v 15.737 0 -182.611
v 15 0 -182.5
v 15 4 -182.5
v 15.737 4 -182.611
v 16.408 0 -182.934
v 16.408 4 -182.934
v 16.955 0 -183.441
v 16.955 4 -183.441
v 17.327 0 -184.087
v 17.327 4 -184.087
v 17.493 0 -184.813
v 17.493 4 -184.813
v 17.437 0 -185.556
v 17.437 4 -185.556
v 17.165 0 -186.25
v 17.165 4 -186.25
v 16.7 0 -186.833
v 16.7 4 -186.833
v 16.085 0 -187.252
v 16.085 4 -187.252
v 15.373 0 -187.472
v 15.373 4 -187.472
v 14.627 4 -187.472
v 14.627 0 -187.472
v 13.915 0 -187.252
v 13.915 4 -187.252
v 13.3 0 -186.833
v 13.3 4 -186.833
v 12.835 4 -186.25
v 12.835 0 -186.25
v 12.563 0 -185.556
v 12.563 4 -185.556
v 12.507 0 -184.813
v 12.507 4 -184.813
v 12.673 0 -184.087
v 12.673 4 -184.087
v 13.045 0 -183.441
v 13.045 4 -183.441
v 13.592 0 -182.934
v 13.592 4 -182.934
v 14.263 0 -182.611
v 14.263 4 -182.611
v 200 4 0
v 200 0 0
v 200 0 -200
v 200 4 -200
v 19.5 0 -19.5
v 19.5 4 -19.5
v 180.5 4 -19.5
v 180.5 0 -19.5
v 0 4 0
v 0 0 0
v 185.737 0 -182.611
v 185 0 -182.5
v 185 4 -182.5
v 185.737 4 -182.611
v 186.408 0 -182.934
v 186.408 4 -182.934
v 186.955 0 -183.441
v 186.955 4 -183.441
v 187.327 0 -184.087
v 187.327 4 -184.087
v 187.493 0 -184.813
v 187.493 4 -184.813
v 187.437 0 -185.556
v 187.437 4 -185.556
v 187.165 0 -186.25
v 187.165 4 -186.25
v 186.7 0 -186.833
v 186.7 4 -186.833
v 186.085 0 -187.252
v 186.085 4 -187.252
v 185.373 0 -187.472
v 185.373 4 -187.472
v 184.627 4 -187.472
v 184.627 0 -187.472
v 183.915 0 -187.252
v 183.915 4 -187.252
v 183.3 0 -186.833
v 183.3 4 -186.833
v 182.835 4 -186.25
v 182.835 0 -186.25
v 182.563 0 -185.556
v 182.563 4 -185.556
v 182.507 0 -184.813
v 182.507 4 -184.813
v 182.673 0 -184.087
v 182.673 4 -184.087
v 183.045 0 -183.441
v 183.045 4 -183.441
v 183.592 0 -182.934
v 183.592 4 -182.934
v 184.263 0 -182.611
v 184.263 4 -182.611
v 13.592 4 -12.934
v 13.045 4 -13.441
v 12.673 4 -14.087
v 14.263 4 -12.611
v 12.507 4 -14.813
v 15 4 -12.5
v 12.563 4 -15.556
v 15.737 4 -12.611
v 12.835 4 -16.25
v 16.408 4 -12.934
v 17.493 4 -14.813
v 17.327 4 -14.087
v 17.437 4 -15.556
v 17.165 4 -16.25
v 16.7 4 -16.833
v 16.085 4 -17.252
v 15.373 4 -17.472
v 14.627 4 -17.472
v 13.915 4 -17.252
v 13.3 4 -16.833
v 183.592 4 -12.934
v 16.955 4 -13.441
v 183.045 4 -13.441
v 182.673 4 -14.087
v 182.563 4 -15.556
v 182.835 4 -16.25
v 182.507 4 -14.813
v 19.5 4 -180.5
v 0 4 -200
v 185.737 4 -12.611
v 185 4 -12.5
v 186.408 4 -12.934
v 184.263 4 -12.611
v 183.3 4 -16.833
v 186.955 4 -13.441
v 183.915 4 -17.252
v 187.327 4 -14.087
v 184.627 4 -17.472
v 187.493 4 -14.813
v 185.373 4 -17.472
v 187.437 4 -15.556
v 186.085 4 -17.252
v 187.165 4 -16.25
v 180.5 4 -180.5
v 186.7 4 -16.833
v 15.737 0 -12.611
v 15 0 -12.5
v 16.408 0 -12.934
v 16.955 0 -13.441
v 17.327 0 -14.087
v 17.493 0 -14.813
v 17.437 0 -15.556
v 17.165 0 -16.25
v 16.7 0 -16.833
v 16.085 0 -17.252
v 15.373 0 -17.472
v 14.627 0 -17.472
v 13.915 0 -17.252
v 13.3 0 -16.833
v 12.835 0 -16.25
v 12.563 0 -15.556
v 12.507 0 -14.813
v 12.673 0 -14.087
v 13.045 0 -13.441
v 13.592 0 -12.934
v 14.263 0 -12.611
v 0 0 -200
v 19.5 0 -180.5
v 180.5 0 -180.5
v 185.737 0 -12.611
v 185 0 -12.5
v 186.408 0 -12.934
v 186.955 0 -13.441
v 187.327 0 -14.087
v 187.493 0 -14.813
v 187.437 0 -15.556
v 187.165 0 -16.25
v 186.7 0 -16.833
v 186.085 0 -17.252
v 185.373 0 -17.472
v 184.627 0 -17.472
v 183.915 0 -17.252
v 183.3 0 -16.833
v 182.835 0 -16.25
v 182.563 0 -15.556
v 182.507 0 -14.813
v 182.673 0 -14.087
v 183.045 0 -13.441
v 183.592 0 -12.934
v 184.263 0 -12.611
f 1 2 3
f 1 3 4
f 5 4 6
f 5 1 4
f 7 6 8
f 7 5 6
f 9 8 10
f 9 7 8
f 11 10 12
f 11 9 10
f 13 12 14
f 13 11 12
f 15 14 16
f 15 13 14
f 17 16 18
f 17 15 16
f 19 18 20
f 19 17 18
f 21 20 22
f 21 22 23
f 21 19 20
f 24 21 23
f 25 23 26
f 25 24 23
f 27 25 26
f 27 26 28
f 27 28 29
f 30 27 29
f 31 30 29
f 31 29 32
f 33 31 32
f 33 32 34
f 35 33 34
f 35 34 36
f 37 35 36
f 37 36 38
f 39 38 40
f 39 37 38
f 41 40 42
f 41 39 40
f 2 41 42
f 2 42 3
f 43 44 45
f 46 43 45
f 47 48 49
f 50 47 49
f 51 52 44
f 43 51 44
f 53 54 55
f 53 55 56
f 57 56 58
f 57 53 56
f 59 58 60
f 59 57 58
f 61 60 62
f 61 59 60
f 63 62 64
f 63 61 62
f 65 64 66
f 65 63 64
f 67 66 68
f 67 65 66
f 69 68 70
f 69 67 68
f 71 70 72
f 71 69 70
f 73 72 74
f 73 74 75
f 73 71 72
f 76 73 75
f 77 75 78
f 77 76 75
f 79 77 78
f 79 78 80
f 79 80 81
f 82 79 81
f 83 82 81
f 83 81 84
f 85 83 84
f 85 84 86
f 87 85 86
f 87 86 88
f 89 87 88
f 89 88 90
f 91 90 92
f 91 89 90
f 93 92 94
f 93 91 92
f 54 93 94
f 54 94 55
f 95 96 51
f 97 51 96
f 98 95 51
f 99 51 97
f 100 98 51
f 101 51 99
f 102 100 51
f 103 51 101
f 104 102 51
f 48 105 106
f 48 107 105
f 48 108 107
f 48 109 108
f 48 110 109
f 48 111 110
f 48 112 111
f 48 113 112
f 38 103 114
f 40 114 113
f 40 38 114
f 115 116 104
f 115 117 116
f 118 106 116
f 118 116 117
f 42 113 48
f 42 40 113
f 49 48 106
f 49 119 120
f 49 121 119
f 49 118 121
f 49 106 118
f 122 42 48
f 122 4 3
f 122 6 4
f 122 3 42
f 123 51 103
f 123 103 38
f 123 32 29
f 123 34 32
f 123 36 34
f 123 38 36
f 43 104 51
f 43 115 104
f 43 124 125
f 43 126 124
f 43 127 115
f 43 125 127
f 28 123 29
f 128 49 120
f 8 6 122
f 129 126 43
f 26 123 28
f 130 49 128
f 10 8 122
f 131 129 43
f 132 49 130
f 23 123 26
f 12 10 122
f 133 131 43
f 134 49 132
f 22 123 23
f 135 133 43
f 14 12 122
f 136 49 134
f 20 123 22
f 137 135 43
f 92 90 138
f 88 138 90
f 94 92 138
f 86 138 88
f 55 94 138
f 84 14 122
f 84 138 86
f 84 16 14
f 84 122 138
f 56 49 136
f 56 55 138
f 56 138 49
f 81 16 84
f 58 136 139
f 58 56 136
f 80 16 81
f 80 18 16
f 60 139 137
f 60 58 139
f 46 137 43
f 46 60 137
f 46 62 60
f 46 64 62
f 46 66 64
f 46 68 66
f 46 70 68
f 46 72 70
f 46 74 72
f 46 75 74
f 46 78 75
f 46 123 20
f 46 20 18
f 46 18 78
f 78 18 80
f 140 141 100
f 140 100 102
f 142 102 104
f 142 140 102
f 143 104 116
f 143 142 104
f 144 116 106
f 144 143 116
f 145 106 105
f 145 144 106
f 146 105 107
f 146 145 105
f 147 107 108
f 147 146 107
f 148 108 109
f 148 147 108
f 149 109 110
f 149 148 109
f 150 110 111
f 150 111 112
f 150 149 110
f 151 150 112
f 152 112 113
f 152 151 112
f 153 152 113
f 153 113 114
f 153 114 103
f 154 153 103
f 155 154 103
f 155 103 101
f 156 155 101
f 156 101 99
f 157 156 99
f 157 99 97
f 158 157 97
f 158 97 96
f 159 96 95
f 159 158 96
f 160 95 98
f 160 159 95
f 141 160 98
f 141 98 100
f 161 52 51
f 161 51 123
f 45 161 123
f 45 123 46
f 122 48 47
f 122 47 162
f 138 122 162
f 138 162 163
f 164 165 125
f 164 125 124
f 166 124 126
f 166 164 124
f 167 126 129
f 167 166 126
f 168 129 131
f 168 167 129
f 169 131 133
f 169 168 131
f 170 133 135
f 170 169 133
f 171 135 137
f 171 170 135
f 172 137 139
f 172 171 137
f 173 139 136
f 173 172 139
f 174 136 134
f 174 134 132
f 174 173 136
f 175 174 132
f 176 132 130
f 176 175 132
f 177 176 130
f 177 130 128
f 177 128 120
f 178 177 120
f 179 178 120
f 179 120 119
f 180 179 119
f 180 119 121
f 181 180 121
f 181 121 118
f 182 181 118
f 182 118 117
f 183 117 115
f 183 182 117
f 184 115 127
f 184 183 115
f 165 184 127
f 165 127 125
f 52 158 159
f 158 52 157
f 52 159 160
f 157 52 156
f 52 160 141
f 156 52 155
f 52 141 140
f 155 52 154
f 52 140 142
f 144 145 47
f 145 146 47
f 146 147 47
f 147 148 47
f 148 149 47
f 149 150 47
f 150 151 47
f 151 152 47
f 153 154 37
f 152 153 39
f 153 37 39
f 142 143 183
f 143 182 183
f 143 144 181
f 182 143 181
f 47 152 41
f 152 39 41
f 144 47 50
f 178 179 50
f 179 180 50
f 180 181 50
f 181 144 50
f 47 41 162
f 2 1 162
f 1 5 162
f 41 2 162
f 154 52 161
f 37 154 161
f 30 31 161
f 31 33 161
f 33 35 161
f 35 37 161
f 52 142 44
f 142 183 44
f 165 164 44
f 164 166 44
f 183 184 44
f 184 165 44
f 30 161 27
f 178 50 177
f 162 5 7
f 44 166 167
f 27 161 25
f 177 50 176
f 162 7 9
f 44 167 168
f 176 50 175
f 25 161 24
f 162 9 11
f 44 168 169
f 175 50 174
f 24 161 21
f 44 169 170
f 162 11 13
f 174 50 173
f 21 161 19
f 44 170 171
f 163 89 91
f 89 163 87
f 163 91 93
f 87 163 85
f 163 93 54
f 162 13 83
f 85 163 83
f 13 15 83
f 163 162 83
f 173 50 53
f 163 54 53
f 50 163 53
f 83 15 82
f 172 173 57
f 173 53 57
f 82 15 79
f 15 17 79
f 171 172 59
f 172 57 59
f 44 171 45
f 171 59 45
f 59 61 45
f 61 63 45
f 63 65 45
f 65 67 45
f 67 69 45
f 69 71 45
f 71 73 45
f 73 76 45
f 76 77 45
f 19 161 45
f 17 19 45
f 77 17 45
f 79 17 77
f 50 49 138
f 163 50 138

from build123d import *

# Parameters (mm, degrees)
CROQUIS1_W              = 200
CROQUIS1_H              = 200
CROQUIS1_R              = 2.5
SALIENTE_EXTRUIR1_DEPTH = 4
CROQUIS2_W              = 158
CROQUIS2_H              = 158
CORTAR_EXTRUIR1_DEPTH   = 10
CROQUIS3_W              = 161
CROQUIS3_H              = 161
CORTAR_EXTRUIR2_DEPTH   = 10


with BuildPart() as part:
    # Croquis1 → Saliente-Extruir1 (new body)
    with BuildSketch(Plane(origin=(0, 0, 0), x_dir=(1, 0, 0), z_dir=(0, 1, 0))):
        with Locations((100, 100)):
            Rectangle(CROQUIS1_W, CROQUIS1_H)
        with Locations(Location((15, 185, 0), (0, 0, 270))):
            Circle(CROQUIS1_R, mode=Mode.SUBTRACT)
        with Locations(Location((185, 185, 0), (0, 0, 270))):
            Circle(CROQUIS1_R, mode=Mode.SUBTRACT)
        with Locations(Location((185, 15, 0), (0, 0, 270))):
            Circle(CROQUIS1_R, mode=Mode.SUBTRACT)
        with Locations(Location((15, 15, 0), (0, 0, 270))):
            Circle(CROQUIS1_R, mode=Mode.SUBTRACT)
    extrude(amount=SALIENTE_EXTRUIR1_DEPTH)

    # Croquis2 → Cortar-Extruir1 (cut)
    with BuildSketch(Plane(origin=(0, 4, 0), x_dir=(1, 0, 0), z_dir=(0, 1, 0))):
        with Locations((100, 100)):
            Rectangle(CROQUIS2_W, CROQUIS2_H)
    extrude(amount=-CORTAR_EXTRUIR1_DEPTH, mode=Mode.SUBTRACT)

    # Croquis3 → Cortar-Extruir2 (cut)
    with BuildSketch(Plane(origin=(0, 4, 0), x_dir=(1, 0, 0), z_dir=(0, 1, 0))):
        with Locations((100, 100)):
            Rectangle(CROQUIS3_W, CROQUIS3_H)
    extrude(amount=-CORTAR_EXTRUIR2_DEPTH, mode=Mode.SUBTRACT)


solid = part.part
